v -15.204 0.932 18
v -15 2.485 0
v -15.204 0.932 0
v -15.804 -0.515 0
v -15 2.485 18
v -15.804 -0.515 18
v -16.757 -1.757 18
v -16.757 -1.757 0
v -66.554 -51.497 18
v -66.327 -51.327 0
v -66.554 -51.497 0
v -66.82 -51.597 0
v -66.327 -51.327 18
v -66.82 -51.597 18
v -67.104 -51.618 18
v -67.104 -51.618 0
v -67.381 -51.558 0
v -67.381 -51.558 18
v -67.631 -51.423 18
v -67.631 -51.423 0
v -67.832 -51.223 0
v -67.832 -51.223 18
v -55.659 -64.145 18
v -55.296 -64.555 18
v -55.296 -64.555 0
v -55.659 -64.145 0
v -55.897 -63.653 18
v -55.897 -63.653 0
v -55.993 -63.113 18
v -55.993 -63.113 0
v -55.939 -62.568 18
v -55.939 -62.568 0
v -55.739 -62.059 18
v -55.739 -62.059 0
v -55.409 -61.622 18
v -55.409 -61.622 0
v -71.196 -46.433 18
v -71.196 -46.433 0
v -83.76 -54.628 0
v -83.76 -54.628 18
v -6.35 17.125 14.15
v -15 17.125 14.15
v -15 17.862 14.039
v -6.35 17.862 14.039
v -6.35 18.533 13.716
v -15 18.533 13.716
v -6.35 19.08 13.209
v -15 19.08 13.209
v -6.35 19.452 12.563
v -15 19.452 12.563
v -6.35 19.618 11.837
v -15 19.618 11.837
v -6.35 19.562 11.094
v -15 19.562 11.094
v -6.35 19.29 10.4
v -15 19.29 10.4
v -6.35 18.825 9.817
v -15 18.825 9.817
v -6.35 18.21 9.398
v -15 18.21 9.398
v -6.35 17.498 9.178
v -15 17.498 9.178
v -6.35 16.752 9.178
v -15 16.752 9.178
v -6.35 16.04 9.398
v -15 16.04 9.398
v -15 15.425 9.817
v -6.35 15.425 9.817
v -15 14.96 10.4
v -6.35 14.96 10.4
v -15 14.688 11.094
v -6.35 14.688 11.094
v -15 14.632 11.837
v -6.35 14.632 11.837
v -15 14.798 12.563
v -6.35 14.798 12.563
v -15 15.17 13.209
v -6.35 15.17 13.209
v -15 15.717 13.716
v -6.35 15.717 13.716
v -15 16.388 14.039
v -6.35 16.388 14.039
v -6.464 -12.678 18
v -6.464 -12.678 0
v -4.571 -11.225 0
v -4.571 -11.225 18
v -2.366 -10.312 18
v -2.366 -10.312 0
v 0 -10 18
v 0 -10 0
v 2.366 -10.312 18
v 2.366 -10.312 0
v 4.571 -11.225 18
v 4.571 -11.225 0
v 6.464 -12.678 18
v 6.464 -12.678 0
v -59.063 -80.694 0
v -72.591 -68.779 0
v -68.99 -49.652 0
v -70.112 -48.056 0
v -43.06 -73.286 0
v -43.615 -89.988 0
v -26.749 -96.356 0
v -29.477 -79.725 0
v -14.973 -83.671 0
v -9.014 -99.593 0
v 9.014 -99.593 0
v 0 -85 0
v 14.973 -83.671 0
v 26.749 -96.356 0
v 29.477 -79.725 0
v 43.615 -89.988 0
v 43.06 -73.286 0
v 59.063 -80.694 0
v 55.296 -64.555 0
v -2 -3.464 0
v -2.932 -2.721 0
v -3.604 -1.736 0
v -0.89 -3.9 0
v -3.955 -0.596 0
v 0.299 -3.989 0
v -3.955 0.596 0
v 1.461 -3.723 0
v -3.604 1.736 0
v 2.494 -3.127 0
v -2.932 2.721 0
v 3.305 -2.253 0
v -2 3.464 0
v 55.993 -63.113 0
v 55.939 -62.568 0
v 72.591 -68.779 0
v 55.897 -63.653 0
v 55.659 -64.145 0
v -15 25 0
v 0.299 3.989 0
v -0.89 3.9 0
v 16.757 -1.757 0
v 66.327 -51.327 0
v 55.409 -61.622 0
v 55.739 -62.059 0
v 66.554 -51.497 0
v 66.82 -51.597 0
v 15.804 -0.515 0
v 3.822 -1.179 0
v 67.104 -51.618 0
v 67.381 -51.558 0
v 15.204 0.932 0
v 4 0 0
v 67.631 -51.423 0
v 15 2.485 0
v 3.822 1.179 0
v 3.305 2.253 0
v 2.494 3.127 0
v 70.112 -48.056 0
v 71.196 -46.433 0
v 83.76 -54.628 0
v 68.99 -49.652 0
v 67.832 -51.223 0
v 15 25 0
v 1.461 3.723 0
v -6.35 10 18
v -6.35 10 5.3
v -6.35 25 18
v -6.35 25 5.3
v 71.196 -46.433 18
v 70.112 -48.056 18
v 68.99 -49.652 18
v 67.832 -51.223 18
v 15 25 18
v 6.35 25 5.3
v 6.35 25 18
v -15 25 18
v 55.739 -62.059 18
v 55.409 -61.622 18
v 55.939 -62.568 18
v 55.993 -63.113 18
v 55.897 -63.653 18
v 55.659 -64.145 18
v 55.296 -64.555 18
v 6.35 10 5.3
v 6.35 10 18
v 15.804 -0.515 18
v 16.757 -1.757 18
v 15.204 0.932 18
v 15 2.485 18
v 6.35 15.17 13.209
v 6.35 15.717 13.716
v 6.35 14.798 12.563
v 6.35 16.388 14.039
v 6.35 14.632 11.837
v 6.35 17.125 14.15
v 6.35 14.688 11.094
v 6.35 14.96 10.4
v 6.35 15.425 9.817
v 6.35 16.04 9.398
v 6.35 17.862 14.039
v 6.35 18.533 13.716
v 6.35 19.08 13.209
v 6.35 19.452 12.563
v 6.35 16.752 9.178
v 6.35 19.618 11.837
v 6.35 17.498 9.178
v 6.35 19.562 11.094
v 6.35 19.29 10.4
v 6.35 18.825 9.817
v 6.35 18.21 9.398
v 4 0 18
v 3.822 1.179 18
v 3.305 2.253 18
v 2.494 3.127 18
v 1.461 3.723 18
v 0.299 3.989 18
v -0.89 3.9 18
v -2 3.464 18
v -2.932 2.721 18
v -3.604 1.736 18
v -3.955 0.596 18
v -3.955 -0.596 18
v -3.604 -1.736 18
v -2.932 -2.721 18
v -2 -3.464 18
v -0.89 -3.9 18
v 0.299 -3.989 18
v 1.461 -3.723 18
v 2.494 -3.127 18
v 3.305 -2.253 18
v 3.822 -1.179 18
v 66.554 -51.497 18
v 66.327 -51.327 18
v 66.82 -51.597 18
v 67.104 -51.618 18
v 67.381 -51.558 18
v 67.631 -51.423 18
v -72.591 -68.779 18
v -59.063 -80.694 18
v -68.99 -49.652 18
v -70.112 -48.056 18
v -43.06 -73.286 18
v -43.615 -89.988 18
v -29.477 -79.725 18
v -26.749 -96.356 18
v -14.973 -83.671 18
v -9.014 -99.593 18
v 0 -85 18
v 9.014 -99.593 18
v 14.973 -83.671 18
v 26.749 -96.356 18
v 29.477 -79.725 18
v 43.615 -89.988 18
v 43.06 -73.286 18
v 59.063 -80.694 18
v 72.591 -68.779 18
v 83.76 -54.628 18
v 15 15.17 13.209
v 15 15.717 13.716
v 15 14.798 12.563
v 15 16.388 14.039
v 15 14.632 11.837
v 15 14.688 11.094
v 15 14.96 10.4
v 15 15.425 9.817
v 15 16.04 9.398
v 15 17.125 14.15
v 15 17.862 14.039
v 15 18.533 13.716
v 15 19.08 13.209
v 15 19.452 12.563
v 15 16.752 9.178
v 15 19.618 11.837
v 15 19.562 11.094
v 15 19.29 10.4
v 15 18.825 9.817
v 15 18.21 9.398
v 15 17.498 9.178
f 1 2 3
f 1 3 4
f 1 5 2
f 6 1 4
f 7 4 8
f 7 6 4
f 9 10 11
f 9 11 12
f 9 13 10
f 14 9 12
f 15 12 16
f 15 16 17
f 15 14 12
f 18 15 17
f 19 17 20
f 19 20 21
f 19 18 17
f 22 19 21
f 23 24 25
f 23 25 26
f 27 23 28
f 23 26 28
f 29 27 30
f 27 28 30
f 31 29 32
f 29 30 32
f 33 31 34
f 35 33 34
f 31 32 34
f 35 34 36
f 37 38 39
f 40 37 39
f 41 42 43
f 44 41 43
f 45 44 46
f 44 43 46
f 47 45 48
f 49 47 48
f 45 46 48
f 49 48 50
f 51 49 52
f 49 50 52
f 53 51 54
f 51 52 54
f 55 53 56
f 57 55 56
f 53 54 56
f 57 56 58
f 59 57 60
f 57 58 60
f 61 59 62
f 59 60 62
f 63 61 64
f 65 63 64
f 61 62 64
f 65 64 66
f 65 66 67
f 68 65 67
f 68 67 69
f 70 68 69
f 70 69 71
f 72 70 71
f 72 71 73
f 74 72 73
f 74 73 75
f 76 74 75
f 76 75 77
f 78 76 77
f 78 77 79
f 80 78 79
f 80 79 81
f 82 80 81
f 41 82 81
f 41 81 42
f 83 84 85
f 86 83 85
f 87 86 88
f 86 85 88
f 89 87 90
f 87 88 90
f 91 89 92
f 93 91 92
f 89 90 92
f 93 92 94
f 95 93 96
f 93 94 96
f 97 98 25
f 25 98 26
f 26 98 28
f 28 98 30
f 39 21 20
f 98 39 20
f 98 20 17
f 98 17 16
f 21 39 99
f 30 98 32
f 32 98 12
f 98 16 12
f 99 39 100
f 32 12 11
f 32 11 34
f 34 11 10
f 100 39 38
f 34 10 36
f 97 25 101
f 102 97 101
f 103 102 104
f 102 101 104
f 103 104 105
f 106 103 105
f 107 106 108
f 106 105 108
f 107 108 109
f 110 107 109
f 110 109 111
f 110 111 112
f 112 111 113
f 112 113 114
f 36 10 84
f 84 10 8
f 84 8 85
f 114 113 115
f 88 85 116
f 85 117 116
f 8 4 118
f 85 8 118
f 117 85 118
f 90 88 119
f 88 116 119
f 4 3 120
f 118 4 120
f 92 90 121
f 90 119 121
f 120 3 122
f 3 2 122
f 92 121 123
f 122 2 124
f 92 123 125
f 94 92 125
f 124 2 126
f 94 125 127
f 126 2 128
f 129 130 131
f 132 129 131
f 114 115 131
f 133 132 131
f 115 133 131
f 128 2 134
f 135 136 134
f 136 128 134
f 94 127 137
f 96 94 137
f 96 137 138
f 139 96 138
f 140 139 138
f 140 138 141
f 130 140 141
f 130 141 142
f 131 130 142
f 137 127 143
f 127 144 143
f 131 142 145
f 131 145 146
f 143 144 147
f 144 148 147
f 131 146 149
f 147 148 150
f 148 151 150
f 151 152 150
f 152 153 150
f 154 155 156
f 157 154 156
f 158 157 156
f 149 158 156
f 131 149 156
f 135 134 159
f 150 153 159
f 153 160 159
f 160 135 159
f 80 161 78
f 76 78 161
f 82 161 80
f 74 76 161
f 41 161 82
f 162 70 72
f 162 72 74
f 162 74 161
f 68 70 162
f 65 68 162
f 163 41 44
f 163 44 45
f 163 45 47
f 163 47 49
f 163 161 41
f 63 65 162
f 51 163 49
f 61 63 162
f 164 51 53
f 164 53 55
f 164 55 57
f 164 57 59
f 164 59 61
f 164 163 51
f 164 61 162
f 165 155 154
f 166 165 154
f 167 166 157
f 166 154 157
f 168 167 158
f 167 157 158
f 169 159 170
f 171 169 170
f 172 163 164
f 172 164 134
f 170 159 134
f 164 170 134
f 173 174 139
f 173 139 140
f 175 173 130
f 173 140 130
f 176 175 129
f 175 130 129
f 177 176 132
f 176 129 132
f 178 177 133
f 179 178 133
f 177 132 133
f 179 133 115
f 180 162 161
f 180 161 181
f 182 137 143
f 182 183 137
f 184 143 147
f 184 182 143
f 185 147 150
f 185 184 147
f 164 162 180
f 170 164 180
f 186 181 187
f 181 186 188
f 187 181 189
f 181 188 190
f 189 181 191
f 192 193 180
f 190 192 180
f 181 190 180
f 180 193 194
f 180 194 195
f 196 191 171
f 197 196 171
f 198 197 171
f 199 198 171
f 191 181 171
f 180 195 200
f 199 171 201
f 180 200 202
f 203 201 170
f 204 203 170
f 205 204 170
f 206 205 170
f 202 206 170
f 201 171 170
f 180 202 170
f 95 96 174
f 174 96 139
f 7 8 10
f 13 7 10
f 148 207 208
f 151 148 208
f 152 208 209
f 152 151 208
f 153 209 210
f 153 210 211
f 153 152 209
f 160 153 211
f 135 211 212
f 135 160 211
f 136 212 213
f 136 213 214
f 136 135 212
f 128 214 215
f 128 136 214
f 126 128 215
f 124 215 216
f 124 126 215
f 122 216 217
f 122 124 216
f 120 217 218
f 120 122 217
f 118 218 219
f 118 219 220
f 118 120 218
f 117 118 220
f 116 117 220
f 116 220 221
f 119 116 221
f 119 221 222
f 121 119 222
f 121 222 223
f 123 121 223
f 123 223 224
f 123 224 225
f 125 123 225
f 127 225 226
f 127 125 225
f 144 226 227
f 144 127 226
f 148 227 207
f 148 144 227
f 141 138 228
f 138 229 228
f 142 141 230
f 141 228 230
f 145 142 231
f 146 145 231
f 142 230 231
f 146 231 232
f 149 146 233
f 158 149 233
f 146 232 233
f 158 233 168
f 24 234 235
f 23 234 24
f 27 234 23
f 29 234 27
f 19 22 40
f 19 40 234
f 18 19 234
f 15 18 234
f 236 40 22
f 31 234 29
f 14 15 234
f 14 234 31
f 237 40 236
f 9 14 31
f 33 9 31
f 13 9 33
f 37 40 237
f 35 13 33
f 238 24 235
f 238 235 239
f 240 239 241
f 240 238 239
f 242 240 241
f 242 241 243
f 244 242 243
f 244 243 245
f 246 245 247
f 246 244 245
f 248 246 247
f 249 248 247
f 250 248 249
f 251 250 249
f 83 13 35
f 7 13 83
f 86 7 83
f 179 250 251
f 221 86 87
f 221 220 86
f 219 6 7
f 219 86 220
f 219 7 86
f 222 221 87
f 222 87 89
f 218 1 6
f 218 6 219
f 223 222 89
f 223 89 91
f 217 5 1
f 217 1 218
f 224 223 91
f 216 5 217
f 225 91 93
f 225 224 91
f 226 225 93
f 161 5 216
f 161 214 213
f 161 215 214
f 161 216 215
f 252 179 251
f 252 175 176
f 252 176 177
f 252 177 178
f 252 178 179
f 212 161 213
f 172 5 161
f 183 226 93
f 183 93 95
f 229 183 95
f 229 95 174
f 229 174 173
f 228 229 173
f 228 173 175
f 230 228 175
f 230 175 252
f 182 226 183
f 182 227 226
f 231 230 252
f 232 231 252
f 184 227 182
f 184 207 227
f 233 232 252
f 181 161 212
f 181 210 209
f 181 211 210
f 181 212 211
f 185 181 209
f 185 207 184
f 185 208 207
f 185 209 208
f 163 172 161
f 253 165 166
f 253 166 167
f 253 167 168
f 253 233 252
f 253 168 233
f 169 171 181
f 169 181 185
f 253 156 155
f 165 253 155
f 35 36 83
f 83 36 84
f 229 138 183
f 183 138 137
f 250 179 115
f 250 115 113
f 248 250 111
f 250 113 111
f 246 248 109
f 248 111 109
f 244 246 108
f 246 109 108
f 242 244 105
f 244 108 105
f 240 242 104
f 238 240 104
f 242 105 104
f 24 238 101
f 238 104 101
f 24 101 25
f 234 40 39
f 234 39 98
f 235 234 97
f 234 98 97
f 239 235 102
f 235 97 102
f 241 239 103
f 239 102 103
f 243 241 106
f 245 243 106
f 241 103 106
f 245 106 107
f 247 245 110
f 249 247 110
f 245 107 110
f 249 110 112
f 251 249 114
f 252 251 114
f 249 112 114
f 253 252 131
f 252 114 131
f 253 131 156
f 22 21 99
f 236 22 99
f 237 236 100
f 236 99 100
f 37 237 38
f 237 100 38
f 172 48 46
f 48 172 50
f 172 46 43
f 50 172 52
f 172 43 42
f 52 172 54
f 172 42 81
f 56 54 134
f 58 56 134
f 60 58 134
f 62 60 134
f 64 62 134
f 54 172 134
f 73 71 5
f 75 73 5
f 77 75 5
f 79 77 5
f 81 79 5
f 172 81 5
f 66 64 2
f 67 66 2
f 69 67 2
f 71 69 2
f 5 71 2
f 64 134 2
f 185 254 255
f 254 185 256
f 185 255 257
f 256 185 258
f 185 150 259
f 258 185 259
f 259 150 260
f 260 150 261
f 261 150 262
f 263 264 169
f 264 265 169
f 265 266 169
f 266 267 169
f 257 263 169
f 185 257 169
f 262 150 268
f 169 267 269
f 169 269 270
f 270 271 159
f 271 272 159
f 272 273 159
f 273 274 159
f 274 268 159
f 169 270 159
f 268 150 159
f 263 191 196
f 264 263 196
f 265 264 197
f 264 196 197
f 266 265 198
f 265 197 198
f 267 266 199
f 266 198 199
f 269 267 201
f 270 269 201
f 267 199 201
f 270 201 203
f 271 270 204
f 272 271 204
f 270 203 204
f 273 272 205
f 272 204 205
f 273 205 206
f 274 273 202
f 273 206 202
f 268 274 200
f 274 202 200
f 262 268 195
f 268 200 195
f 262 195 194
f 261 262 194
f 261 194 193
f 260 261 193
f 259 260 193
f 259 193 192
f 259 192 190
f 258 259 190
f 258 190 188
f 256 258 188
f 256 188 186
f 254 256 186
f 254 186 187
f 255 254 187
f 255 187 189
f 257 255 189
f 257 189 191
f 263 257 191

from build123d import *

# Parameters (mm, degrees)
ESQUISSE1_R             = 4
BOSS_EXTRU_1_DEPTH      = 18
ESQUISSE2_W             = 12.7
ESQUISSE2_H             = 12.7
ENL_V_MAT_EXTRU_1_DEPTH = 15
ESQUISSE3_R             = 2.5
ENL_V_MAT_EXTRU_2_DEPTH = 30
CONG_1_R                = 1
CONG_2_R                = 6


with BuildPart() as part:
    # Esquisse1 → Boss.-Extru.1 (new body)
    with BuildSketch(Plane.XY):
        with BuildLine():
            Line((15, 25), (-15, 25))
            Line((-15, 25), (-15, 0))
            Line((-15, 0), (-67.134302209, -52.134302209))
            ThreePointArc((-67.134302209, -52.134302209), (-69.224071464, -49.325732939), (-71.196421393, -46.433496324))
            Line((-71.196421393, -46.433496324), (-83.760495756, -54.627642734))
            ThreePointArc((-83.760495756, -54.627642734), (0, -100), (83.760495756, -54.627642734))
            Line((83.760495756, -54.627642734), (71.196421393, -46.433496324))
            ThreePointArc((71.196421393, -46.433496324), (69.224071464, -49.325732939), (67.134302209, -52.134302209))
            Line((67.134302209, -52.134302209), (15, 0))
            Line((15, 0), (15, 25))
        make_face()
        Circle(ESQUISSE1_R, mode=Mode.SUBTRACT)
        with BuildLine():
            Line((-55.408885371, -61.622088806), (-6.464466094, -12.67766953))
            ThreePointArc((-6.464466094, -12.67766953), (0, -10), (6.464466094, -12.67766953))
            Line((6.464466094, -12.67766953), (55.408885371, -61.622088806))
            ThreePointArc((55.408885371, -61.622088806), (55.993185687, -63.113388543), (55.295748237, -64.555249414))
            ThreePointArc((55.295748237, -64.555249414), (0, -85), (-55.295748237, -64.555249414))
            ThreePointArc((-55.295748237, -64.555249414), (-55.993185687, -63.113388543), (-55.408885371, -61.622088806))
        make_face(mode=Mode.SUBTRACT)
    extrude(amount=BOSS_EXTRU_1_DEPTH)

    # Esquisse2 → Enlèv. mat.-Extru.1 (cut)
    with BuildSketch(Plane(origin=(0, 25, 0), x_dir=(1, 0, 0), z_dir=(0, 1, 0))):
        with Locations((0, -11.65)):
            Rectangle(ESQUISSE2_W, ESQUISSE2_H)
    extrude(amount=-ENL_V_MAT_EXTRU_1_DEPTH, mode=Mode.SUBTRACT)

    # Esquisse3 → Enlèv. mat.-Extru.2 (cut)
    with BuildSketch(Plane.ZY.offset(15)):
        with Locations((11.65, 17.125)):
            Circle(ESQUISSE3_R)
    extrude(amount=-ENL_V_MAT_EXTRU_2_DEPTH, mode=Mode.SUBTRACT)

    # Congé1
    cong_1_edges = [part.edges().sort_by_distance(p)[0] for p in [
        (67.134302209, -52.134302209, 9),
        (-67.134302209, -52.134302209, 9),
    ]]
    fillet(cong_1_edges, radius=CONG_1_R)

    # Congé2
    cong_2_edges = [part.edges().sort_by_distance(p)[0] for p in [
        (15, 0, 9),
        (-15, 0, 9),
    ]]
    fillet(cong_2_edges, radius=CONG_2_R)


solid = part.part
